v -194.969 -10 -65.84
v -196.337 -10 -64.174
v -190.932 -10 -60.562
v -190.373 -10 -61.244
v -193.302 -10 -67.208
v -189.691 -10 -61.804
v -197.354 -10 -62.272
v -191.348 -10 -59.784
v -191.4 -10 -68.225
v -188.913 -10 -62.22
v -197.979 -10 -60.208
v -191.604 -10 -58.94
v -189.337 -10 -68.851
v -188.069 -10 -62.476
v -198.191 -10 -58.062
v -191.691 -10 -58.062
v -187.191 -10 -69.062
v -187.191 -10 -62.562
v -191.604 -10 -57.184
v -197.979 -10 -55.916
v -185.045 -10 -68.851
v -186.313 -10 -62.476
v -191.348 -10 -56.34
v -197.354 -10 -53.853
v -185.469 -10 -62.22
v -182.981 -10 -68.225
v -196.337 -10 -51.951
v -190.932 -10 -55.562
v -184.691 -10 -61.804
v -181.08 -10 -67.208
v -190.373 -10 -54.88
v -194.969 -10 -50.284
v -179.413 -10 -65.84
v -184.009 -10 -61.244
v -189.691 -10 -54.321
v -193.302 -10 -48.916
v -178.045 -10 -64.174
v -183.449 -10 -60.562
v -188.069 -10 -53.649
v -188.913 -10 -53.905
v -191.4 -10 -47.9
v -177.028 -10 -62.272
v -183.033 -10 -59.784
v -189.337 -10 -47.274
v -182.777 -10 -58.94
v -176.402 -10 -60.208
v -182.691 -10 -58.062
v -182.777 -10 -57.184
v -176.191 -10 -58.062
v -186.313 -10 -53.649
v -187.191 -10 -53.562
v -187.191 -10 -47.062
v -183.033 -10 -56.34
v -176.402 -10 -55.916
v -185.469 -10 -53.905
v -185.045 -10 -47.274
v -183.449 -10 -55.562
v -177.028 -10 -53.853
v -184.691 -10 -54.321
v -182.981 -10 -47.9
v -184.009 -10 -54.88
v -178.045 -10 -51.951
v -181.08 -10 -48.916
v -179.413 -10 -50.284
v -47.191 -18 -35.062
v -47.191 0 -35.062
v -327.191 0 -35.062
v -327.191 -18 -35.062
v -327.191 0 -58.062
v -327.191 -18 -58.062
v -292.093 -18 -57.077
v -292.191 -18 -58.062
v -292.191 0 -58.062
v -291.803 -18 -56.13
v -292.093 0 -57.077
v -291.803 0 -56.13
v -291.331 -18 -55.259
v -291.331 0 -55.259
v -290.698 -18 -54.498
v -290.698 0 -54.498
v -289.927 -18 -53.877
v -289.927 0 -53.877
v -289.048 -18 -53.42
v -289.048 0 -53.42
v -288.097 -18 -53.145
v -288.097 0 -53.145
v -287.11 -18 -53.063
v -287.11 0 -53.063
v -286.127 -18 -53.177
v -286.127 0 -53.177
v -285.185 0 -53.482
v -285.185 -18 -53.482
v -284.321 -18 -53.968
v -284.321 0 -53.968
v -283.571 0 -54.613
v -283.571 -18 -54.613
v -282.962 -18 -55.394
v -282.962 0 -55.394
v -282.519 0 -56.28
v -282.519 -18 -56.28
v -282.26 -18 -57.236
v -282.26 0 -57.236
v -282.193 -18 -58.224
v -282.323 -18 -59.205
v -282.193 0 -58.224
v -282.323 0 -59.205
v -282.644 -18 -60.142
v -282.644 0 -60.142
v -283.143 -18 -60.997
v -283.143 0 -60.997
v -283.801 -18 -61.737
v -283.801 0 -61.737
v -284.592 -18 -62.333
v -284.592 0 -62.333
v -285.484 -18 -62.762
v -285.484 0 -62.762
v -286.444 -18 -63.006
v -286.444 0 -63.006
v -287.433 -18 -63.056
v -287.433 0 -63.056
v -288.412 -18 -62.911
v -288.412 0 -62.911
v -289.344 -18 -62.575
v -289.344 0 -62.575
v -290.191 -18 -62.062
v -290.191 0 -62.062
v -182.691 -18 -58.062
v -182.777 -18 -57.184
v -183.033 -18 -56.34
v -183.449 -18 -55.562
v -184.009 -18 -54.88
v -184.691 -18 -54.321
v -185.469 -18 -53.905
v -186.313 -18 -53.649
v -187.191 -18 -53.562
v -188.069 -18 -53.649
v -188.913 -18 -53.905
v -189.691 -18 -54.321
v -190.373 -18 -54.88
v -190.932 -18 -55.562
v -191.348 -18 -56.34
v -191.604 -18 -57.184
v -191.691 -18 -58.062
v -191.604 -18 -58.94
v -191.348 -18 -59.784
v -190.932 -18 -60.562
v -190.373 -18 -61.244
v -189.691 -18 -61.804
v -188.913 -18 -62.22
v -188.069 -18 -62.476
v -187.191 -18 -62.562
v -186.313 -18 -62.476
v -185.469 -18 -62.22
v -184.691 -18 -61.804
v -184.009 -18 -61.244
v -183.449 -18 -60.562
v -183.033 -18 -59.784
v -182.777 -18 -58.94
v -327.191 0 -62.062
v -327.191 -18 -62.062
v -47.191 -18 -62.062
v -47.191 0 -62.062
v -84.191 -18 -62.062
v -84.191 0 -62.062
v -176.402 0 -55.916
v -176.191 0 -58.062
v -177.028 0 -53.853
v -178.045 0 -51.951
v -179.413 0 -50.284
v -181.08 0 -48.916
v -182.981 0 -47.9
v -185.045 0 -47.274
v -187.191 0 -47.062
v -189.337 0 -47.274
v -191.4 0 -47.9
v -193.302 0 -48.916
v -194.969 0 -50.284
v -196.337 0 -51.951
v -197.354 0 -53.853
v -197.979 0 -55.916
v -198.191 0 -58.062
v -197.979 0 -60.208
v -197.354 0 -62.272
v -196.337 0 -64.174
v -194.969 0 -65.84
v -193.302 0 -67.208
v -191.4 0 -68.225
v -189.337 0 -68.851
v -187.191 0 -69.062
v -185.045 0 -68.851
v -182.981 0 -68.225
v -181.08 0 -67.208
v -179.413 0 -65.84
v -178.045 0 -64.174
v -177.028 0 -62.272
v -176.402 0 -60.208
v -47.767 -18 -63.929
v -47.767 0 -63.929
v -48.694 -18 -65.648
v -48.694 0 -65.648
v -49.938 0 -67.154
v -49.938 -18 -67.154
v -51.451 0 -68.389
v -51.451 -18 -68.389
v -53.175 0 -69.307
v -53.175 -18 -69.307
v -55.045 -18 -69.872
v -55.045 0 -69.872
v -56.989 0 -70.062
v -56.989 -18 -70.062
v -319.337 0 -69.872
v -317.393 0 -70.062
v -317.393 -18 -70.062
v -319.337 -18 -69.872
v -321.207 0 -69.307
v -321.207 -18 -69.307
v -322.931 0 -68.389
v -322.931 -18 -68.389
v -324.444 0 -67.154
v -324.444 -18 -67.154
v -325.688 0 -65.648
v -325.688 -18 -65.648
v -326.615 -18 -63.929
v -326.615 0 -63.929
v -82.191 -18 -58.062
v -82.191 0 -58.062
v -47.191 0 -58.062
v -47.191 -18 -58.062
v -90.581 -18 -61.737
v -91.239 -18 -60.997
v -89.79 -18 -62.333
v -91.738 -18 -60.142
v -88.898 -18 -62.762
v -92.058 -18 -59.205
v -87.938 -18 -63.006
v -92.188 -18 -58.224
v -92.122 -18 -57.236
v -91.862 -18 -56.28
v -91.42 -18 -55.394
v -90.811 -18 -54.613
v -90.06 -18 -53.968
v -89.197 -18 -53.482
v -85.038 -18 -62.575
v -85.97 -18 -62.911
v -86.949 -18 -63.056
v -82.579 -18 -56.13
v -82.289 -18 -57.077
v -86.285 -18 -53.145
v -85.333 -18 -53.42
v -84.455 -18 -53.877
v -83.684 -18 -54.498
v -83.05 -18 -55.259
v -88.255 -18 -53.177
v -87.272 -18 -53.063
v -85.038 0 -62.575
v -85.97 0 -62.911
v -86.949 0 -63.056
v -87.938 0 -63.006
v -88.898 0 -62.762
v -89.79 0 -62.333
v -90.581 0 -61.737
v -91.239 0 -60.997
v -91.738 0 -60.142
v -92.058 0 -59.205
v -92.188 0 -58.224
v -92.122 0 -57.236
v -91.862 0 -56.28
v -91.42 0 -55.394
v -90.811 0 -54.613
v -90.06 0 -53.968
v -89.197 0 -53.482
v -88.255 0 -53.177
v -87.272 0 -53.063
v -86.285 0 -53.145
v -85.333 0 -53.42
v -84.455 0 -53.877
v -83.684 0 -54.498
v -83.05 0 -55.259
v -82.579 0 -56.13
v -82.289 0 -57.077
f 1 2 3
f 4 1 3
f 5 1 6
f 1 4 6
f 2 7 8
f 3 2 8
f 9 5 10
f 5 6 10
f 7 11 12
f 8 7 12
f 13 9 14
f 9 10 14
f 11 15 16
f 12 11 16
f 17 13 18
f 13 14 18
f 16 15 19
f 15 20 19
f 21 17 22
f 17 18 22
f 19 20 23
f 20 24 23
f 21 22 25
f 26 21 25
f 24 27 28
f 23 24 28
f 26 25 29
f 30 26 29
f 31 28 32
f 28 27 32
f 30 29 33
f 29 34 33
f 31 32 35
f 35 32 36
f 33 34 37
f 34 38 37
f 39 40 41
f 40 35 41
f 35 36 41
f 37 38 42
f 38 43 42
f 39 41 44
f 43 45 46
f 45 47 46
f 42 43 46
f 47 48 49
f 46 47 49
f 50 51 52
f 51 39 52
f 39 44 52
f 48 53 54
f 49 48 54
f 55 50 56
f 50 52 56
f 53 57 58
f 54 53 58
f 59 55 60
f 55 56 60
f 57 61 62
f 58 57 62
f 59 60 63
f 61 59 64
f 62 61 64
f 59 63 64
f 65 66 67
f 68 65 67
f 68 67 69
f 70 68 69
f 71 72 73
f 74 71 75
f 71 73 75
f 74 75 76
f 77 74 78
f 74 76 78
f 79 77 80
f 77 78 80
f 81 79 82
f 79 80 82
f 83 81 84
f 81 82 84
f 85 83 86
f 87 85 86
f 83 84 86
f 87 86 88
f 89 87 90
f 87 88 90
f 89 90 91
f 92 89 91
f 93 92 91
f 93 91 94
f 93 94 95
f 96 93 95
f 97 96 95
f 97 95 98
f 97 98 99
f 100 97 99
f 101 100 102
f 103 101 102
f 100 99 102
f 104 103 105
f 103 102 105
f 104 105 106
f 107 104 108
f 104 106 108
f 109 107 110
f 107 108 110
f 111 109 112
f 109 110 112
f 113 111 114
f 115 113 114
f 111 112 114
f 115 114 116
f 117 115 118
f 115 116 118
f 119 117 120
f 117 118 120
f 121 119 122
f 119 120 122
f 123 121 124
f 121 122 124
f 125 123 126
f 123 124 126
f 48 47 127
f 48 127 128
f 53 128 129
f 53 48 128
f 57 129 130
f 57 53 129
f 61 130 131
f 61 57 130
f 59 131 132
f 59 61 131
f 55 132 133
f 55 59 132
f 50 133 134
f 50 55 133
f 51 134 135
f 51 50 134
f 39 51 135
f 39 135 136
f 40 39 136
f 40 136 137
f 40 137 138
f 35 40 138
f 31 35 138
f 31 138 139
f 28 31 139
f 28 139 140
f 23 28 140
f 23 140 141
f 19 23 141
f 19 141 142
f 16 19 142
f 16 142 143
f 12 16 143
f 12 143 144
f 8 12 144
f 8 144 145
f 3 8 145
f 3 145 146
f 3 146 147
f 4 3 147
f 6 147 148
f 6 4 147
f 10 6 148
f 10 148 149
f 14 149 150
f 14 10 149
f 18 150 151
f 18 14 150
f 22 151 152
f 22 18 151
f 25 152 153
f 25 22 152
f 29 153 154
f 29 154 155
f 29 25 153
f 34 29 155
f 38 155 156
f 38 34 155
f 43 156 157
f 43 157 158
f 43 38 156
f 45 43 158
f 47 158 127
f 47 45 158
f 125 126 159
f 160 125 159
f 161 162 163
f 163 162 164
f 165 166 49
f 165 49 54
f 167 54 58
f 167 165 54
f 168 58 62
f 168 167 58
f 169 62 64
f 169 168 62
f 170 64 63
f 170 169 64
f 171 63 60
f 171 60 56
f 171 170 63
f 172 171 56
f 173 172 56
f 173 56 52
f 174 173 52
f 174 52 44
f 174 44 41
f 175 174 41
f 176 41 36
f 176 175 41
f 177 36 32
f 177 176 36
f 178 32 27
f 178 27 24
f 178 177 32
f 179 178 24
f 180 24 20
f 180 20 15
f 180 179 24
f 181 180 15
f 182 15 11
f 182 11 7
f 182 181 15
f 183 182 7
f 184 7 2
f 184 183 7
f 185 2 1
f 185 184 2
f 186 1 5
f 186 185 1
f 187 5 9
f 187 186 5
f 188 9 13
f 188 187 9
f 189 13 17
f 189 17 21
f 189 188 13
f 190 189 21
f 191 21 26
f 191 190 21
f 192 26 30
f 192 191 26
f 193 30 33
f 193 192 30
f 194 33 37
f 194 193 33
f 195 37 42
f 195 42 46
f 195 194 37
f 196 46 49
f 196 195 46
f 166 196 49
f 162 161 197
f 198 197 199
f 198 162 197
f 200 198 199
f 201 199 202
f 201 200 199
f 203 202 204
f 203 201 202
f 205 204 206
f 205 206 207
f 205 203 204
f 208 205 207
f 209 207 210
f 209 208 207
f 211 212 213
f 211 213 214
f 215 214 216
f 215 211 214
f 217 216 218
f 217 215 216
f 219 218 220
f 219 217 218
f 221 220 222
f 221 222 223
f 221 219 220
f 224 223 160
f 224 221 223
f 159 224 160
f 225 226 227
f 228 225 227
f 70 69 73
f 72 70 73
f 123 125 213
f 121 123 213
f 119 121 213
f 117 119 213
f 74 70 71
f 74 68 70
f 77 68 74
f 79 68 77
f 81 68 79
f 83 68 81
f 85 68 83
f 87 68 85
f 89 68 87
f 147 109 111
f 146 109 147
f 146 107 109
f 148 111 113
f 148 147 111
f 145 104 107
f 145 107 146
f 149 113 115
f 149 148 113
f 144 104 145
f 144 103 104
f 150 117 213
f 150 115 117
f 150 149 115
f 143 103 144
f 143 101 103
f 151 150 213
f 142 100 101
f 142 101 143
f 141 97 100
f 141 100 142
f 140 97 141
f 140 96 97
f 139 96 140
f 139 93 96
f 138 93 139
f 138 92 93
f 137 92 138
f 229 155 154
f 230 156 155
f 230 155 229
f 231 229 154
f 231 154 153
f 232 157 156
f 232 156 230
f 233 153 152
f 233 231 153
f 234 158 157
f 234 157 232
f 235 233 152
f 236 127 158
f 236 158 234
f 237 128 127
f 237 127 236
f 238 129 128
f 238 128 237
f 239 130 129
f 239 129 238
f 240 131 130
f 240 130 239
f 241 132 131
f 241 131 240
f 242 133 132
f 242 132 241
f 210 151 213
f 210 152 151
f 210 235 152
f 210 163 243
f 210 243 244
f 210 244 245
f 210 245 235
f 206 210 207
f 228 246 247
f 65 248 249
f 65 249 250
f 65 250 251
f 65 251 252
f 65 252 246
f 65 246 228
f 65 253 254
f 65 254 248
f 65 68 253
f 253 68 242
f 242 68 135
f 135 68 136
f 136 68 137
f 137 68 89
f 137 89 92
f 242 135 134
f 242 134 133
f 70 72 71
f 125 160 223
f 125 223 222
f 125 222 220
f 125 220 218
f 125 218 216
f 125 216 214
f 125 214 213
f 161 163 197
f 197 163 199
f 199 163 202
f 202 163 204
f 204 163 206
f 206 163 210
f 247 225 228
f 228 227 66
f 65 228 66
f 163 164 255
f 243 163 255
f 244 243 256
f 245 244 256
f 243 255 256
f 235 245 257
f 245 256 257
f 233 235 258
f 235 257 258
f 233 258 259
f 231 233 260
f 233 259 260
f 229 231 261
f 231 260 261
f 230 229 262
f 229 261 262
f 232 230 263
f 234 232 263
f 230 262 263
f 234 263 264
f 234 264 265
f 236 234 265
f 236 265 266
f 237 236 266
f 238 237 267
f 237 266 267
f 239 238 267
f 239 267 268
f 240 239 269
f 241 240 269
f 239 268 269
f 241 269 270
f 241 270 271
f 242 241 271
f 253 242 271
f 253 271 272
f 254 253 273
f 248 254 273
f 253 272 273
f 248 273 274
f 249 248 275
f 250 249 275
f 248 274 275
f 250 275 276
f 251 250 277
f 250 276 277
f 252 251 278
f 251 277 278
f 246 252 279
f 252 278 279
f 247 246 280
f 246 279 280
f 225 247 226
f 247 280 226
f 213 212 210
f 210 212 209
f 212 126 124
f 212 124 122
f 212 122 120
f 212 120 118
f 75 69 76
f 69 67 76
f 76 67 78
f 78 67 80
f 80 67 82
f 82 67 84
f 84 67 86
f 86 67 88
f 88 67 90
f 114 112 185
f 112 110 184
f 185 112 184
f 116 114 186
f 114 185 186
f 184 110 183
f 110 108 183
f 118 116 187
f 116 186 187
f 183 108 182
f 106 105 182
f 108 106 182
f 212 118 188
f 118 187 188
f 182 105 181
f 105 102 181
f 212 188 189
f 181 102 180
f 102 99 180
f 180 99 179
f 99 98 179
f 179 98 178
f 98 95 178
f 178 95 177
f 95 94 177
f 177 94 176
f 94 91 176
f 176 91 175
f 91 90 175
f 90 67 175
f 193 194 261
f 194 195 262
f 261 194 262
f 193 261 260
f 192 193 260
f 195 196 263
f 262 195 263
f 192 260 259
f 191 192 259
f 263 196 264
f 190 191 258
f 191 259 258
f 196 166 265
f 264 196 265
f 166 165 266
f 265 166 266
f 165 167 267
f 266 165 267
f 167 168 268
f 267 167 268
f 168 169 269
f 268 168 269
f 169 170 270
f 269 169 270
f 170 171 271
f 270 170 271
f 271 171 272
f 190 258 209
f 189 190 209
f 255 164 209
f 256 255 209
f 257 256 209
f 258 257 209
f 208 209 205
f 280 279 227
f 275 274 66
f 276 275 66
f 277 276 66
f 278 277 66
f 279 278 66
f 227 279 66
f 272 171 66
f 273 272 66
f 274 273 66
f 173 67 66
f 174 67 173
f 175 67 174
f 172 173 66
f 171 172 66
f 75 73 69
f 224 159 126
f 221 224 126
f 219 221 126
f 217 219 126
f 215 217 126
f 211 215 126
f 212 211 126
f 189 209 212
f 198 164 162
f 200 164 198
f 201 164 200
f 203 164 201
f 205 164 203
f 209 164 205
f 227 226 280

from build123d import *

# Parameters (mm, degrees)
F0_R        = 11
F0_R_2      = 4.5
F1_DEPTH    = 18
F2_DEPTH    = 10
F3_T1_DEPTH = 66.9897948557


# Not quite as in the source:
# - a fillet or chamfer that OpenCascade refuses, or shapes differently, is made with other operations: its cross-section is extruded or revolved along the edge and cut away or added
# - a feature names something its author has since deleted; it is built from what else it names


with BuildPart() as f1:
    # F0 (on Front) → F1 (new body)
    with BuildSketch(Plane.XZ):
        with BuildLine():
            Line((-47.1908605099, -35.0622619203), (-327.1908605099, -35.0622619203))
            Line((-327.1908605099, -35.0622619203), (-327.1908605099, -58.0622619203))
            Line((-327.1908605099, -58.0622619203), (-292.1908605099, -58.0622619203))
            ThreePointArc((-292.1908605099, -58.0622619203), (-287.1908605099, -53.0622619203), (-282.1908605099, -58.0622619203))
            ThreePointArc((-282.1908605099, -58.0622619203), (-284.9547925324, -62.5343978753), (-290.1908605099, -62.0622619203))
            Line((-290.1908605099, -62.0622619203), (-327.1908605099, -62.0622619203))
            Line((-327.1908605099, -62.0622619203), (-327.1908605099, -70.0622619203))
            Line((-327.1908605099, -70.0622619203), (-47.1908605099, -70.0622619203))
            Line((-47.1908605099, -70.0622619203), (-47.1908605099, -62.0622619203))
            Line((-47.1908605099, -62.0622619203), (-84.1908605099, -62.0622619203))
            ThreePointArc((-84.1908605099, -62.0622619203), (-91.6629964649, -55.8261939428), (-82.1908605099, -58.0622619203))
            Line((-82.1908605099, -58.0622619203), (-47.1908605099, -58.0622619203))
            Line((-47.1908605099, -58.0622619203), (-47.1908605099, -35.0622619203))
        make_face()
        with Locations((-187.1908605099, -58.0622619203)):
            Circle(F0_R, mode=Mode.SUBTRACT)
        with Locations((-187.1908605099, -58.0622619203)):
            Circle(F0_R)
        with Locations((-187.1908605099, -58.0622619203)):
            Circle(F0_R_2, mode=Mode.SUBTRACT)
    extrude(amount=F1_DEPTH)

    # F0 (on Front) → F2 (cut)
    with BuildSketch(Plane.XZ):
        with Locations((-187.1908605099, -58.0622619203)):
            Circle(F0_R)
        with Locations((-187.1908605099, -58.0622619203)):
            Circle(F0_R_2, mode=Mode.SUBTRACT)
    extrude(amount=F2_DEPTH, mode=Mode.SUBTRACT)

    # F3: fillet of radius 10 on 2 edges, made by hand

    # F3_s2 → F3_t1 (cut)
    with BuildSketch(Plane.XZ.offset(-24.4948974278)):
        with BuildLine():
            ThreePointArc((-317.3929015387, -70.0622619203), (-323.7174568591, -67.8082286127), (-327.1908605099, -62.0622619203))
            Line((-327.1908605099, -62.0622619203), (-327.1908605099, -70.0622619203))
            Line((-327.1908605099, -70.0622619203), (-317.3929015387, -70.0622619203))
        make_face()
        with BuildLine():
            ThreePointArc((-47.1908605099, -62.0622619203), (-50.6642641607, -67.8082286127), (-56.988819481, -70.0622619203))
            Line((-56.988819481, -70.0622619203), (-47.1908605099, -70.0622619203))
            Line((-47.1908605099, -70.0622619203), (-47.1908605099, -62.0622619203))
        make_face()
    extrude(amount=F3_T1_DEPTH, mode=Mode.SUBTRACT)


solid = f1.part
